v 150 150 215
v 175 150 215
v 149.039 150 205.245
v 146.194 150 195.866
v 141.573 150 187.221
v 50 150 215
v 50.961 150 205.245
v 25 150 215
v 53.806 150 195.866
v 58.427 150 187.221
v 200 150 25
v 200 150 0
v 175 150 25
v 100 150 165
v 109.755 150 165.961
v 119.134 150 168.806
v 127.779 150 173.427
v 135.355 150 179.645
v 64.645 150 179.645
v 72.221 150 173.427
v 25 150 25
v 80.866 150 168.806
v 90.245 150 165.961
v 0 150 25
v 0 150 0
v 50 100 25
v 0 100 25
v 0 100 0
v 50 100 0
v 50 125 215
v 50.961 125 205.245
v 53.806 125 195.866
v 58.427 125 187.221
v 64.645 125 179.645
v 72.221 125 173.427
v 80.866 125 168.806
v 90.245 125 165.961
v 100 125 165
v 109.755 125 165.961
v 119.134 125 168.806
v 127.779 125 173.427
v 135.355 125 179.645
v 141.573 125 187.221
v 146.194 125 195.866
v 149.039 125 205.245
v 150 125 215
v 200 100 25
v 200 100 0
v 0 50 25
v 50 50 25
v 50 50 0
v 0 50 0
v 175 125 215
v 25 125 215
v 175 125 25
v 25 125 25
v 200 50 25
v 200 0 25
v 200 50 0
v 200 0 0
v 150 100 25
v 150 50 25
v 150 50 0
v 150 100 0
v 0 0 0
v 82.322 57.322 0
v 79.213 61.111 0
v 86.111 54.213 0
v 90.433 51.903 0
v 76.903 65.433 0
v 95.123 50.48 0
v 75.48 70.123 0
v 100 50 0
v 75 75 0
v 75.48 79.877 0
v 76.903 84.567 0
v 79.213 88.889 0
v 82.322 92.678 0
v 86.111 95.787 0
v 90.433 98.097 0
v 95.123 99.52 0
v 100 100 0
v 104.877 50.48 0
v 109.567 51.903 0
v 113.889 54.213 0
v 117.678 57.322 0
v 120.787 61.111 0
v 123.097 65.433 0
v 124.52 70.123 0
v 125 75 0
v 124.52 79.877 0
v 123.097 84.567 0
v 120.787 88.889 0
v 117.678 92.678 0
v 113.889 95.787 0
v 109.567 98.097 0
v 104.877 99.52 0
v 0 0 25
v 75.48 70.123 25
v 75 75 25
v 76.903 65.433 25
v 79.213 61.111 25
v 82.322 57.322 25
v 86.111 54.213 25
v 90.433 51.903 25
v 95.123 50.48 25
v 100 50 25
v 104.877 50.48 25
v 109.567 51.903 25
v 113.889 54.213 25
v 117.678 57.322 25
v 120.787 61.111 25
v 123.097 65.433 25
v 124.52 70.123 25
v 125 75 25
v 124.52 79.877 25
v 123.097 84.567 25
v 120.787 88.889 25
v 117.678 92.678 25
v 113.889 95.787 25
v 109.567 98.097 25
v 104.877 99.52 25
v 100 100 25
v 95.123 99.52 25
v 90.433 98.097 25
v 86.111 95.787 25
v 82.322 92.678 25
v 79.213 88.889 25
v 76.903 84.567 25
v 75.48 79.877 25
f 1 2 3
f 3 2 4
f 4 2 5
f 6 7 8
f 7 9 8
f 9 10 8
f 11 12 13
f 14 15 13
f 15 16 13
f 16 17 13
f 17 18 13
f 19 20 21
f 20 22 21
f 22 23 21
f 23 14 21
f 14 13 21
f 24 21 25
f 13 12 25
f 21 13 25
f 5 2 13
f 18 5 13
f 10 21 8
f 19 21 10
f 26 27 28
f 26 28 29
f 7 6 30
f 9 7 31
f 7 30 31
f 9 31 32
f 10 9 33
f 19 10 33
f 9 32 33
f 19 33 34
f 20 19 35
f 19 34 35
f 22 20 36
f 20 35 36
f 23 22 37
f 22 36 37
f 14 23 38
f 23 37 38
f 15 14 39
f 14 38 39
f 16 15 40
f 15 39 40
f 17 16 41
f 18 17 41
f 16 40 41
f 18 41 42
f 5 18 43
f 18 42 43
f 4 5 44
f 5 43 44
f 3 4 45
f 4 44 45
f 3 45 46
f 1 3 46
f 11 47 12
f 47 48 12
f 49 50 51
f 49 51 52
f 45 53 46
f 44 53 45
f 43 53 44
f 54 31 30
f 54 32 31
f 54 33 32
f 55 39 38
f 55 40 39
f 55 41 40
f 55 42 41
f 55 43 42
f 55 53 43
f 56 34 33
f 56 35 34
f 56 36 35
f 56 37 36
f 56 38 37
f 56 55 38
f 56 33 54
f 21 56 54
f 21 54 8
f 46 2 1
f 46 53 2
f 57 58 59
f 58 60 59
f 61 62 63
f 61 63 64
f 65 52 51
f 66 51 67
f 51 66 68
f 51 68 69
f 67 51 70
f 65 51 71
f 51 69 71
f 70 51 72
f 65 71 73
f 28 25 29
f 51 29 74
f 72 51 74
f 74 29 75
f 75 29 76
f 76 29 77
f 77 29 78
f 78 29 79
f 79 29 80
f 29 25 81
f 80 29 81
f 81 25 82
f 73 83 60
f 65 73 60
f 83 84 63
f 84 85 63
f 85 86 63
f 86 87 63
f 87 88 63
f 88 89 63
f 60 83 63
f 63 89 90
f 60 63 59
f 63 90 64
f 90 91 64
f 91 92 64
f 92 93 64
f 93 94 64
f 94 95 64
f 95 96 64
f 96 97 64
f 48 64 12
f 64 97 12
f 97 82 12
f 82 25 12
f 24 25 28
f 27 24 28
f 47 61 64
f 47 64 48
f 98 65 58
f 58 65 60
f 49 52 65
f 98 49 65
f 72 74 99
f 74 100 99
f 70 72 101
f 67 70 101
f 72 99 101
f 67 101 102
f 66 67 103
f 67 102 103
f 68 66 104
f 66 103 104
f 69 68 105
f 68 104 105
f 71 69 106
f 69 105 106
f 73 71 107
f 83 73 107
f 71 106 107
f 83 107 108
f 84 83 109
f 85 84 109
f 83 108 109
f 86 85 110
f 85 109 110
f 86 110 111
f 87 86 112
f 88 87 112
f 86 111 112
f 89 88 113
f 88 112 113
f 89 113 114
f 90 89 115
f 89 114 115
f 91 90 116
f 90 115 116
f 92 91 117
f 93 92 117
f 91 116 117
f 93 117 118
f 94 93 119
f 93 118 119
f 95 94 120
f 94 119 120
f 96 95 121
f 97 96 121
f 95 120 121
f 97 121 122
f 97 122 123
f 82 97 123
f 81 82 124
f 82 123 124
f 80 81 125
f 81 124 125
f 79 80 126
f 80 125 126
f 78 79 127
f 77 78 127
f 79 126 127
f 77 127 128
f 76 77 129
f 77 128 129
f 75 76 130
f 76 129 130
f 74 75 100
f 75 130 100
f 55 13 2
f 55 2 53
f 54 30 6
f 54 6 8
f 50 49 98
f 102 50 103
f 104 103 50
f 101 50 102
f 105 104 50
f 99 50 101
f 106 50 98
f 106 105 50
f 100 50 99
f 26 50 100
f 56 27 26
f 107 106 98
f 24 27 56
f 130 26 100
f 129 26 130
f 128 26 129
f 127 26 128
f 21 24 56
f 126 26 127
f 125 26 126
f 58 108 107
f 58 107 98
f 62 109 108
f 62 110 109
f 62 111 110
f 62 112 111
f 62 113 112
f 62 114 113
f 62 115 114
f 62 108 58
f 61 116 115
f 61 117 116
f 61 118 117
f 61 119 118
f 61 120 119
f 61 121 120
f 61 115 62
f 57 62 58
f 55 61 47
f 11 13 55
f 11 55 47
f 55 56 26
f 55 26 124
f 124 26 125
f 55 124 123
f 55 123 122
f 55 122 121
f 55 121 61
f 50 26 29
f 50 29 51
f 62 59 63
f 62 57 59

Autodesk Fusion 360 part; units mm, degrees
sketch "Sketch15" plane through (0, 0, 0) normal (0, 0, 1) x (1, 0, 0)
  line L0 (0, 0) -> (200, 0)
  line L1 (200, 0) -> (200, 150)
  line L2 (200, 150) -> (0, 150)
  line L3 (0, 150) -> (0, 0)
  dimension "d98" = 200
  dimension "d99" = 150
extrude "Extrude13" add sketch "Sketch15" along normal blind 25
sketch "Sketch16" plane through (0, 0, 25) normal (0, 0, 1) x (-1, 0, 0)
  line L0 (0, -150) -> (0, 0)
  line L1 (0, 0) -> (-200, 0)
  line L2 (-200, 0) -> (-200, -150)
  line L3 (-200, -150) -> (0, -150)
  line L4 (-200, -50) -> (-150, -50)
  line L5 (-150, -50) -> (-150, -100)
  line L6 (-150, -100) -> (-200, -100)
  line L7 (0, -100) -> (-50, -100)
  line L8 (-50, -100) -> (-50, -50)
  line L9 (-50, -50) -> (0, -50)
  line L10 (0, -75) -> (-100, -75) construction
  circle A0 centre (-100, -75) radius 25
  line L11 (-175, -150) -> (-175, -125)
  line L12 (-175, -125) -> (-25, -125)
  line L13 (-25, -125) -> (-25, -150)
  dimension "d103" = 50
  dimension "d104" = 50
  dimension "d105" = 50
  dimension "d106" = 50
  dimension "d107" = 50
  dimension "d108" = 100
  dimension "d109" = 50
  dimension "d111" = 25
  dimension "d112" = 150
extrude "Extrude14" cut sketch "Sketch16" against normal blind 25 contours L0 L7 L8 L9 | L2 L4 L5 L6
extrude "Extrude15" cut sketch "Sketch16" against normal blind 25 contours A0
extrude "Extrude16" add sketch "Sketch16" along normal blind 190 contours L3 L11 L12 L13
sketch "Sketch17" plane through (0, 125, 0) normal (0, -1, 0) x (1, 0, 0)
  line L0 (25, 25) -> (175, 25)
  line L1 (175, 25) -> (175, 215)
  line L2 (175, 215) -> (25, 215)
  line L3 (25, 215) -> (25, 25)
  line L4 (25, 215) -> (50, 215) construction
  line L5 (175, 215) -> (150, 215) construction
  arc A0 (50, 215) -> (150, 215) centre (100, 215) ccw
  dimension "d119" = 25
  dimension "d120" = 25
  dimension "d121" = 100
extrude "Extrude17" cut sketch "Sketch17" against normal blind 25 contours L2 A0
